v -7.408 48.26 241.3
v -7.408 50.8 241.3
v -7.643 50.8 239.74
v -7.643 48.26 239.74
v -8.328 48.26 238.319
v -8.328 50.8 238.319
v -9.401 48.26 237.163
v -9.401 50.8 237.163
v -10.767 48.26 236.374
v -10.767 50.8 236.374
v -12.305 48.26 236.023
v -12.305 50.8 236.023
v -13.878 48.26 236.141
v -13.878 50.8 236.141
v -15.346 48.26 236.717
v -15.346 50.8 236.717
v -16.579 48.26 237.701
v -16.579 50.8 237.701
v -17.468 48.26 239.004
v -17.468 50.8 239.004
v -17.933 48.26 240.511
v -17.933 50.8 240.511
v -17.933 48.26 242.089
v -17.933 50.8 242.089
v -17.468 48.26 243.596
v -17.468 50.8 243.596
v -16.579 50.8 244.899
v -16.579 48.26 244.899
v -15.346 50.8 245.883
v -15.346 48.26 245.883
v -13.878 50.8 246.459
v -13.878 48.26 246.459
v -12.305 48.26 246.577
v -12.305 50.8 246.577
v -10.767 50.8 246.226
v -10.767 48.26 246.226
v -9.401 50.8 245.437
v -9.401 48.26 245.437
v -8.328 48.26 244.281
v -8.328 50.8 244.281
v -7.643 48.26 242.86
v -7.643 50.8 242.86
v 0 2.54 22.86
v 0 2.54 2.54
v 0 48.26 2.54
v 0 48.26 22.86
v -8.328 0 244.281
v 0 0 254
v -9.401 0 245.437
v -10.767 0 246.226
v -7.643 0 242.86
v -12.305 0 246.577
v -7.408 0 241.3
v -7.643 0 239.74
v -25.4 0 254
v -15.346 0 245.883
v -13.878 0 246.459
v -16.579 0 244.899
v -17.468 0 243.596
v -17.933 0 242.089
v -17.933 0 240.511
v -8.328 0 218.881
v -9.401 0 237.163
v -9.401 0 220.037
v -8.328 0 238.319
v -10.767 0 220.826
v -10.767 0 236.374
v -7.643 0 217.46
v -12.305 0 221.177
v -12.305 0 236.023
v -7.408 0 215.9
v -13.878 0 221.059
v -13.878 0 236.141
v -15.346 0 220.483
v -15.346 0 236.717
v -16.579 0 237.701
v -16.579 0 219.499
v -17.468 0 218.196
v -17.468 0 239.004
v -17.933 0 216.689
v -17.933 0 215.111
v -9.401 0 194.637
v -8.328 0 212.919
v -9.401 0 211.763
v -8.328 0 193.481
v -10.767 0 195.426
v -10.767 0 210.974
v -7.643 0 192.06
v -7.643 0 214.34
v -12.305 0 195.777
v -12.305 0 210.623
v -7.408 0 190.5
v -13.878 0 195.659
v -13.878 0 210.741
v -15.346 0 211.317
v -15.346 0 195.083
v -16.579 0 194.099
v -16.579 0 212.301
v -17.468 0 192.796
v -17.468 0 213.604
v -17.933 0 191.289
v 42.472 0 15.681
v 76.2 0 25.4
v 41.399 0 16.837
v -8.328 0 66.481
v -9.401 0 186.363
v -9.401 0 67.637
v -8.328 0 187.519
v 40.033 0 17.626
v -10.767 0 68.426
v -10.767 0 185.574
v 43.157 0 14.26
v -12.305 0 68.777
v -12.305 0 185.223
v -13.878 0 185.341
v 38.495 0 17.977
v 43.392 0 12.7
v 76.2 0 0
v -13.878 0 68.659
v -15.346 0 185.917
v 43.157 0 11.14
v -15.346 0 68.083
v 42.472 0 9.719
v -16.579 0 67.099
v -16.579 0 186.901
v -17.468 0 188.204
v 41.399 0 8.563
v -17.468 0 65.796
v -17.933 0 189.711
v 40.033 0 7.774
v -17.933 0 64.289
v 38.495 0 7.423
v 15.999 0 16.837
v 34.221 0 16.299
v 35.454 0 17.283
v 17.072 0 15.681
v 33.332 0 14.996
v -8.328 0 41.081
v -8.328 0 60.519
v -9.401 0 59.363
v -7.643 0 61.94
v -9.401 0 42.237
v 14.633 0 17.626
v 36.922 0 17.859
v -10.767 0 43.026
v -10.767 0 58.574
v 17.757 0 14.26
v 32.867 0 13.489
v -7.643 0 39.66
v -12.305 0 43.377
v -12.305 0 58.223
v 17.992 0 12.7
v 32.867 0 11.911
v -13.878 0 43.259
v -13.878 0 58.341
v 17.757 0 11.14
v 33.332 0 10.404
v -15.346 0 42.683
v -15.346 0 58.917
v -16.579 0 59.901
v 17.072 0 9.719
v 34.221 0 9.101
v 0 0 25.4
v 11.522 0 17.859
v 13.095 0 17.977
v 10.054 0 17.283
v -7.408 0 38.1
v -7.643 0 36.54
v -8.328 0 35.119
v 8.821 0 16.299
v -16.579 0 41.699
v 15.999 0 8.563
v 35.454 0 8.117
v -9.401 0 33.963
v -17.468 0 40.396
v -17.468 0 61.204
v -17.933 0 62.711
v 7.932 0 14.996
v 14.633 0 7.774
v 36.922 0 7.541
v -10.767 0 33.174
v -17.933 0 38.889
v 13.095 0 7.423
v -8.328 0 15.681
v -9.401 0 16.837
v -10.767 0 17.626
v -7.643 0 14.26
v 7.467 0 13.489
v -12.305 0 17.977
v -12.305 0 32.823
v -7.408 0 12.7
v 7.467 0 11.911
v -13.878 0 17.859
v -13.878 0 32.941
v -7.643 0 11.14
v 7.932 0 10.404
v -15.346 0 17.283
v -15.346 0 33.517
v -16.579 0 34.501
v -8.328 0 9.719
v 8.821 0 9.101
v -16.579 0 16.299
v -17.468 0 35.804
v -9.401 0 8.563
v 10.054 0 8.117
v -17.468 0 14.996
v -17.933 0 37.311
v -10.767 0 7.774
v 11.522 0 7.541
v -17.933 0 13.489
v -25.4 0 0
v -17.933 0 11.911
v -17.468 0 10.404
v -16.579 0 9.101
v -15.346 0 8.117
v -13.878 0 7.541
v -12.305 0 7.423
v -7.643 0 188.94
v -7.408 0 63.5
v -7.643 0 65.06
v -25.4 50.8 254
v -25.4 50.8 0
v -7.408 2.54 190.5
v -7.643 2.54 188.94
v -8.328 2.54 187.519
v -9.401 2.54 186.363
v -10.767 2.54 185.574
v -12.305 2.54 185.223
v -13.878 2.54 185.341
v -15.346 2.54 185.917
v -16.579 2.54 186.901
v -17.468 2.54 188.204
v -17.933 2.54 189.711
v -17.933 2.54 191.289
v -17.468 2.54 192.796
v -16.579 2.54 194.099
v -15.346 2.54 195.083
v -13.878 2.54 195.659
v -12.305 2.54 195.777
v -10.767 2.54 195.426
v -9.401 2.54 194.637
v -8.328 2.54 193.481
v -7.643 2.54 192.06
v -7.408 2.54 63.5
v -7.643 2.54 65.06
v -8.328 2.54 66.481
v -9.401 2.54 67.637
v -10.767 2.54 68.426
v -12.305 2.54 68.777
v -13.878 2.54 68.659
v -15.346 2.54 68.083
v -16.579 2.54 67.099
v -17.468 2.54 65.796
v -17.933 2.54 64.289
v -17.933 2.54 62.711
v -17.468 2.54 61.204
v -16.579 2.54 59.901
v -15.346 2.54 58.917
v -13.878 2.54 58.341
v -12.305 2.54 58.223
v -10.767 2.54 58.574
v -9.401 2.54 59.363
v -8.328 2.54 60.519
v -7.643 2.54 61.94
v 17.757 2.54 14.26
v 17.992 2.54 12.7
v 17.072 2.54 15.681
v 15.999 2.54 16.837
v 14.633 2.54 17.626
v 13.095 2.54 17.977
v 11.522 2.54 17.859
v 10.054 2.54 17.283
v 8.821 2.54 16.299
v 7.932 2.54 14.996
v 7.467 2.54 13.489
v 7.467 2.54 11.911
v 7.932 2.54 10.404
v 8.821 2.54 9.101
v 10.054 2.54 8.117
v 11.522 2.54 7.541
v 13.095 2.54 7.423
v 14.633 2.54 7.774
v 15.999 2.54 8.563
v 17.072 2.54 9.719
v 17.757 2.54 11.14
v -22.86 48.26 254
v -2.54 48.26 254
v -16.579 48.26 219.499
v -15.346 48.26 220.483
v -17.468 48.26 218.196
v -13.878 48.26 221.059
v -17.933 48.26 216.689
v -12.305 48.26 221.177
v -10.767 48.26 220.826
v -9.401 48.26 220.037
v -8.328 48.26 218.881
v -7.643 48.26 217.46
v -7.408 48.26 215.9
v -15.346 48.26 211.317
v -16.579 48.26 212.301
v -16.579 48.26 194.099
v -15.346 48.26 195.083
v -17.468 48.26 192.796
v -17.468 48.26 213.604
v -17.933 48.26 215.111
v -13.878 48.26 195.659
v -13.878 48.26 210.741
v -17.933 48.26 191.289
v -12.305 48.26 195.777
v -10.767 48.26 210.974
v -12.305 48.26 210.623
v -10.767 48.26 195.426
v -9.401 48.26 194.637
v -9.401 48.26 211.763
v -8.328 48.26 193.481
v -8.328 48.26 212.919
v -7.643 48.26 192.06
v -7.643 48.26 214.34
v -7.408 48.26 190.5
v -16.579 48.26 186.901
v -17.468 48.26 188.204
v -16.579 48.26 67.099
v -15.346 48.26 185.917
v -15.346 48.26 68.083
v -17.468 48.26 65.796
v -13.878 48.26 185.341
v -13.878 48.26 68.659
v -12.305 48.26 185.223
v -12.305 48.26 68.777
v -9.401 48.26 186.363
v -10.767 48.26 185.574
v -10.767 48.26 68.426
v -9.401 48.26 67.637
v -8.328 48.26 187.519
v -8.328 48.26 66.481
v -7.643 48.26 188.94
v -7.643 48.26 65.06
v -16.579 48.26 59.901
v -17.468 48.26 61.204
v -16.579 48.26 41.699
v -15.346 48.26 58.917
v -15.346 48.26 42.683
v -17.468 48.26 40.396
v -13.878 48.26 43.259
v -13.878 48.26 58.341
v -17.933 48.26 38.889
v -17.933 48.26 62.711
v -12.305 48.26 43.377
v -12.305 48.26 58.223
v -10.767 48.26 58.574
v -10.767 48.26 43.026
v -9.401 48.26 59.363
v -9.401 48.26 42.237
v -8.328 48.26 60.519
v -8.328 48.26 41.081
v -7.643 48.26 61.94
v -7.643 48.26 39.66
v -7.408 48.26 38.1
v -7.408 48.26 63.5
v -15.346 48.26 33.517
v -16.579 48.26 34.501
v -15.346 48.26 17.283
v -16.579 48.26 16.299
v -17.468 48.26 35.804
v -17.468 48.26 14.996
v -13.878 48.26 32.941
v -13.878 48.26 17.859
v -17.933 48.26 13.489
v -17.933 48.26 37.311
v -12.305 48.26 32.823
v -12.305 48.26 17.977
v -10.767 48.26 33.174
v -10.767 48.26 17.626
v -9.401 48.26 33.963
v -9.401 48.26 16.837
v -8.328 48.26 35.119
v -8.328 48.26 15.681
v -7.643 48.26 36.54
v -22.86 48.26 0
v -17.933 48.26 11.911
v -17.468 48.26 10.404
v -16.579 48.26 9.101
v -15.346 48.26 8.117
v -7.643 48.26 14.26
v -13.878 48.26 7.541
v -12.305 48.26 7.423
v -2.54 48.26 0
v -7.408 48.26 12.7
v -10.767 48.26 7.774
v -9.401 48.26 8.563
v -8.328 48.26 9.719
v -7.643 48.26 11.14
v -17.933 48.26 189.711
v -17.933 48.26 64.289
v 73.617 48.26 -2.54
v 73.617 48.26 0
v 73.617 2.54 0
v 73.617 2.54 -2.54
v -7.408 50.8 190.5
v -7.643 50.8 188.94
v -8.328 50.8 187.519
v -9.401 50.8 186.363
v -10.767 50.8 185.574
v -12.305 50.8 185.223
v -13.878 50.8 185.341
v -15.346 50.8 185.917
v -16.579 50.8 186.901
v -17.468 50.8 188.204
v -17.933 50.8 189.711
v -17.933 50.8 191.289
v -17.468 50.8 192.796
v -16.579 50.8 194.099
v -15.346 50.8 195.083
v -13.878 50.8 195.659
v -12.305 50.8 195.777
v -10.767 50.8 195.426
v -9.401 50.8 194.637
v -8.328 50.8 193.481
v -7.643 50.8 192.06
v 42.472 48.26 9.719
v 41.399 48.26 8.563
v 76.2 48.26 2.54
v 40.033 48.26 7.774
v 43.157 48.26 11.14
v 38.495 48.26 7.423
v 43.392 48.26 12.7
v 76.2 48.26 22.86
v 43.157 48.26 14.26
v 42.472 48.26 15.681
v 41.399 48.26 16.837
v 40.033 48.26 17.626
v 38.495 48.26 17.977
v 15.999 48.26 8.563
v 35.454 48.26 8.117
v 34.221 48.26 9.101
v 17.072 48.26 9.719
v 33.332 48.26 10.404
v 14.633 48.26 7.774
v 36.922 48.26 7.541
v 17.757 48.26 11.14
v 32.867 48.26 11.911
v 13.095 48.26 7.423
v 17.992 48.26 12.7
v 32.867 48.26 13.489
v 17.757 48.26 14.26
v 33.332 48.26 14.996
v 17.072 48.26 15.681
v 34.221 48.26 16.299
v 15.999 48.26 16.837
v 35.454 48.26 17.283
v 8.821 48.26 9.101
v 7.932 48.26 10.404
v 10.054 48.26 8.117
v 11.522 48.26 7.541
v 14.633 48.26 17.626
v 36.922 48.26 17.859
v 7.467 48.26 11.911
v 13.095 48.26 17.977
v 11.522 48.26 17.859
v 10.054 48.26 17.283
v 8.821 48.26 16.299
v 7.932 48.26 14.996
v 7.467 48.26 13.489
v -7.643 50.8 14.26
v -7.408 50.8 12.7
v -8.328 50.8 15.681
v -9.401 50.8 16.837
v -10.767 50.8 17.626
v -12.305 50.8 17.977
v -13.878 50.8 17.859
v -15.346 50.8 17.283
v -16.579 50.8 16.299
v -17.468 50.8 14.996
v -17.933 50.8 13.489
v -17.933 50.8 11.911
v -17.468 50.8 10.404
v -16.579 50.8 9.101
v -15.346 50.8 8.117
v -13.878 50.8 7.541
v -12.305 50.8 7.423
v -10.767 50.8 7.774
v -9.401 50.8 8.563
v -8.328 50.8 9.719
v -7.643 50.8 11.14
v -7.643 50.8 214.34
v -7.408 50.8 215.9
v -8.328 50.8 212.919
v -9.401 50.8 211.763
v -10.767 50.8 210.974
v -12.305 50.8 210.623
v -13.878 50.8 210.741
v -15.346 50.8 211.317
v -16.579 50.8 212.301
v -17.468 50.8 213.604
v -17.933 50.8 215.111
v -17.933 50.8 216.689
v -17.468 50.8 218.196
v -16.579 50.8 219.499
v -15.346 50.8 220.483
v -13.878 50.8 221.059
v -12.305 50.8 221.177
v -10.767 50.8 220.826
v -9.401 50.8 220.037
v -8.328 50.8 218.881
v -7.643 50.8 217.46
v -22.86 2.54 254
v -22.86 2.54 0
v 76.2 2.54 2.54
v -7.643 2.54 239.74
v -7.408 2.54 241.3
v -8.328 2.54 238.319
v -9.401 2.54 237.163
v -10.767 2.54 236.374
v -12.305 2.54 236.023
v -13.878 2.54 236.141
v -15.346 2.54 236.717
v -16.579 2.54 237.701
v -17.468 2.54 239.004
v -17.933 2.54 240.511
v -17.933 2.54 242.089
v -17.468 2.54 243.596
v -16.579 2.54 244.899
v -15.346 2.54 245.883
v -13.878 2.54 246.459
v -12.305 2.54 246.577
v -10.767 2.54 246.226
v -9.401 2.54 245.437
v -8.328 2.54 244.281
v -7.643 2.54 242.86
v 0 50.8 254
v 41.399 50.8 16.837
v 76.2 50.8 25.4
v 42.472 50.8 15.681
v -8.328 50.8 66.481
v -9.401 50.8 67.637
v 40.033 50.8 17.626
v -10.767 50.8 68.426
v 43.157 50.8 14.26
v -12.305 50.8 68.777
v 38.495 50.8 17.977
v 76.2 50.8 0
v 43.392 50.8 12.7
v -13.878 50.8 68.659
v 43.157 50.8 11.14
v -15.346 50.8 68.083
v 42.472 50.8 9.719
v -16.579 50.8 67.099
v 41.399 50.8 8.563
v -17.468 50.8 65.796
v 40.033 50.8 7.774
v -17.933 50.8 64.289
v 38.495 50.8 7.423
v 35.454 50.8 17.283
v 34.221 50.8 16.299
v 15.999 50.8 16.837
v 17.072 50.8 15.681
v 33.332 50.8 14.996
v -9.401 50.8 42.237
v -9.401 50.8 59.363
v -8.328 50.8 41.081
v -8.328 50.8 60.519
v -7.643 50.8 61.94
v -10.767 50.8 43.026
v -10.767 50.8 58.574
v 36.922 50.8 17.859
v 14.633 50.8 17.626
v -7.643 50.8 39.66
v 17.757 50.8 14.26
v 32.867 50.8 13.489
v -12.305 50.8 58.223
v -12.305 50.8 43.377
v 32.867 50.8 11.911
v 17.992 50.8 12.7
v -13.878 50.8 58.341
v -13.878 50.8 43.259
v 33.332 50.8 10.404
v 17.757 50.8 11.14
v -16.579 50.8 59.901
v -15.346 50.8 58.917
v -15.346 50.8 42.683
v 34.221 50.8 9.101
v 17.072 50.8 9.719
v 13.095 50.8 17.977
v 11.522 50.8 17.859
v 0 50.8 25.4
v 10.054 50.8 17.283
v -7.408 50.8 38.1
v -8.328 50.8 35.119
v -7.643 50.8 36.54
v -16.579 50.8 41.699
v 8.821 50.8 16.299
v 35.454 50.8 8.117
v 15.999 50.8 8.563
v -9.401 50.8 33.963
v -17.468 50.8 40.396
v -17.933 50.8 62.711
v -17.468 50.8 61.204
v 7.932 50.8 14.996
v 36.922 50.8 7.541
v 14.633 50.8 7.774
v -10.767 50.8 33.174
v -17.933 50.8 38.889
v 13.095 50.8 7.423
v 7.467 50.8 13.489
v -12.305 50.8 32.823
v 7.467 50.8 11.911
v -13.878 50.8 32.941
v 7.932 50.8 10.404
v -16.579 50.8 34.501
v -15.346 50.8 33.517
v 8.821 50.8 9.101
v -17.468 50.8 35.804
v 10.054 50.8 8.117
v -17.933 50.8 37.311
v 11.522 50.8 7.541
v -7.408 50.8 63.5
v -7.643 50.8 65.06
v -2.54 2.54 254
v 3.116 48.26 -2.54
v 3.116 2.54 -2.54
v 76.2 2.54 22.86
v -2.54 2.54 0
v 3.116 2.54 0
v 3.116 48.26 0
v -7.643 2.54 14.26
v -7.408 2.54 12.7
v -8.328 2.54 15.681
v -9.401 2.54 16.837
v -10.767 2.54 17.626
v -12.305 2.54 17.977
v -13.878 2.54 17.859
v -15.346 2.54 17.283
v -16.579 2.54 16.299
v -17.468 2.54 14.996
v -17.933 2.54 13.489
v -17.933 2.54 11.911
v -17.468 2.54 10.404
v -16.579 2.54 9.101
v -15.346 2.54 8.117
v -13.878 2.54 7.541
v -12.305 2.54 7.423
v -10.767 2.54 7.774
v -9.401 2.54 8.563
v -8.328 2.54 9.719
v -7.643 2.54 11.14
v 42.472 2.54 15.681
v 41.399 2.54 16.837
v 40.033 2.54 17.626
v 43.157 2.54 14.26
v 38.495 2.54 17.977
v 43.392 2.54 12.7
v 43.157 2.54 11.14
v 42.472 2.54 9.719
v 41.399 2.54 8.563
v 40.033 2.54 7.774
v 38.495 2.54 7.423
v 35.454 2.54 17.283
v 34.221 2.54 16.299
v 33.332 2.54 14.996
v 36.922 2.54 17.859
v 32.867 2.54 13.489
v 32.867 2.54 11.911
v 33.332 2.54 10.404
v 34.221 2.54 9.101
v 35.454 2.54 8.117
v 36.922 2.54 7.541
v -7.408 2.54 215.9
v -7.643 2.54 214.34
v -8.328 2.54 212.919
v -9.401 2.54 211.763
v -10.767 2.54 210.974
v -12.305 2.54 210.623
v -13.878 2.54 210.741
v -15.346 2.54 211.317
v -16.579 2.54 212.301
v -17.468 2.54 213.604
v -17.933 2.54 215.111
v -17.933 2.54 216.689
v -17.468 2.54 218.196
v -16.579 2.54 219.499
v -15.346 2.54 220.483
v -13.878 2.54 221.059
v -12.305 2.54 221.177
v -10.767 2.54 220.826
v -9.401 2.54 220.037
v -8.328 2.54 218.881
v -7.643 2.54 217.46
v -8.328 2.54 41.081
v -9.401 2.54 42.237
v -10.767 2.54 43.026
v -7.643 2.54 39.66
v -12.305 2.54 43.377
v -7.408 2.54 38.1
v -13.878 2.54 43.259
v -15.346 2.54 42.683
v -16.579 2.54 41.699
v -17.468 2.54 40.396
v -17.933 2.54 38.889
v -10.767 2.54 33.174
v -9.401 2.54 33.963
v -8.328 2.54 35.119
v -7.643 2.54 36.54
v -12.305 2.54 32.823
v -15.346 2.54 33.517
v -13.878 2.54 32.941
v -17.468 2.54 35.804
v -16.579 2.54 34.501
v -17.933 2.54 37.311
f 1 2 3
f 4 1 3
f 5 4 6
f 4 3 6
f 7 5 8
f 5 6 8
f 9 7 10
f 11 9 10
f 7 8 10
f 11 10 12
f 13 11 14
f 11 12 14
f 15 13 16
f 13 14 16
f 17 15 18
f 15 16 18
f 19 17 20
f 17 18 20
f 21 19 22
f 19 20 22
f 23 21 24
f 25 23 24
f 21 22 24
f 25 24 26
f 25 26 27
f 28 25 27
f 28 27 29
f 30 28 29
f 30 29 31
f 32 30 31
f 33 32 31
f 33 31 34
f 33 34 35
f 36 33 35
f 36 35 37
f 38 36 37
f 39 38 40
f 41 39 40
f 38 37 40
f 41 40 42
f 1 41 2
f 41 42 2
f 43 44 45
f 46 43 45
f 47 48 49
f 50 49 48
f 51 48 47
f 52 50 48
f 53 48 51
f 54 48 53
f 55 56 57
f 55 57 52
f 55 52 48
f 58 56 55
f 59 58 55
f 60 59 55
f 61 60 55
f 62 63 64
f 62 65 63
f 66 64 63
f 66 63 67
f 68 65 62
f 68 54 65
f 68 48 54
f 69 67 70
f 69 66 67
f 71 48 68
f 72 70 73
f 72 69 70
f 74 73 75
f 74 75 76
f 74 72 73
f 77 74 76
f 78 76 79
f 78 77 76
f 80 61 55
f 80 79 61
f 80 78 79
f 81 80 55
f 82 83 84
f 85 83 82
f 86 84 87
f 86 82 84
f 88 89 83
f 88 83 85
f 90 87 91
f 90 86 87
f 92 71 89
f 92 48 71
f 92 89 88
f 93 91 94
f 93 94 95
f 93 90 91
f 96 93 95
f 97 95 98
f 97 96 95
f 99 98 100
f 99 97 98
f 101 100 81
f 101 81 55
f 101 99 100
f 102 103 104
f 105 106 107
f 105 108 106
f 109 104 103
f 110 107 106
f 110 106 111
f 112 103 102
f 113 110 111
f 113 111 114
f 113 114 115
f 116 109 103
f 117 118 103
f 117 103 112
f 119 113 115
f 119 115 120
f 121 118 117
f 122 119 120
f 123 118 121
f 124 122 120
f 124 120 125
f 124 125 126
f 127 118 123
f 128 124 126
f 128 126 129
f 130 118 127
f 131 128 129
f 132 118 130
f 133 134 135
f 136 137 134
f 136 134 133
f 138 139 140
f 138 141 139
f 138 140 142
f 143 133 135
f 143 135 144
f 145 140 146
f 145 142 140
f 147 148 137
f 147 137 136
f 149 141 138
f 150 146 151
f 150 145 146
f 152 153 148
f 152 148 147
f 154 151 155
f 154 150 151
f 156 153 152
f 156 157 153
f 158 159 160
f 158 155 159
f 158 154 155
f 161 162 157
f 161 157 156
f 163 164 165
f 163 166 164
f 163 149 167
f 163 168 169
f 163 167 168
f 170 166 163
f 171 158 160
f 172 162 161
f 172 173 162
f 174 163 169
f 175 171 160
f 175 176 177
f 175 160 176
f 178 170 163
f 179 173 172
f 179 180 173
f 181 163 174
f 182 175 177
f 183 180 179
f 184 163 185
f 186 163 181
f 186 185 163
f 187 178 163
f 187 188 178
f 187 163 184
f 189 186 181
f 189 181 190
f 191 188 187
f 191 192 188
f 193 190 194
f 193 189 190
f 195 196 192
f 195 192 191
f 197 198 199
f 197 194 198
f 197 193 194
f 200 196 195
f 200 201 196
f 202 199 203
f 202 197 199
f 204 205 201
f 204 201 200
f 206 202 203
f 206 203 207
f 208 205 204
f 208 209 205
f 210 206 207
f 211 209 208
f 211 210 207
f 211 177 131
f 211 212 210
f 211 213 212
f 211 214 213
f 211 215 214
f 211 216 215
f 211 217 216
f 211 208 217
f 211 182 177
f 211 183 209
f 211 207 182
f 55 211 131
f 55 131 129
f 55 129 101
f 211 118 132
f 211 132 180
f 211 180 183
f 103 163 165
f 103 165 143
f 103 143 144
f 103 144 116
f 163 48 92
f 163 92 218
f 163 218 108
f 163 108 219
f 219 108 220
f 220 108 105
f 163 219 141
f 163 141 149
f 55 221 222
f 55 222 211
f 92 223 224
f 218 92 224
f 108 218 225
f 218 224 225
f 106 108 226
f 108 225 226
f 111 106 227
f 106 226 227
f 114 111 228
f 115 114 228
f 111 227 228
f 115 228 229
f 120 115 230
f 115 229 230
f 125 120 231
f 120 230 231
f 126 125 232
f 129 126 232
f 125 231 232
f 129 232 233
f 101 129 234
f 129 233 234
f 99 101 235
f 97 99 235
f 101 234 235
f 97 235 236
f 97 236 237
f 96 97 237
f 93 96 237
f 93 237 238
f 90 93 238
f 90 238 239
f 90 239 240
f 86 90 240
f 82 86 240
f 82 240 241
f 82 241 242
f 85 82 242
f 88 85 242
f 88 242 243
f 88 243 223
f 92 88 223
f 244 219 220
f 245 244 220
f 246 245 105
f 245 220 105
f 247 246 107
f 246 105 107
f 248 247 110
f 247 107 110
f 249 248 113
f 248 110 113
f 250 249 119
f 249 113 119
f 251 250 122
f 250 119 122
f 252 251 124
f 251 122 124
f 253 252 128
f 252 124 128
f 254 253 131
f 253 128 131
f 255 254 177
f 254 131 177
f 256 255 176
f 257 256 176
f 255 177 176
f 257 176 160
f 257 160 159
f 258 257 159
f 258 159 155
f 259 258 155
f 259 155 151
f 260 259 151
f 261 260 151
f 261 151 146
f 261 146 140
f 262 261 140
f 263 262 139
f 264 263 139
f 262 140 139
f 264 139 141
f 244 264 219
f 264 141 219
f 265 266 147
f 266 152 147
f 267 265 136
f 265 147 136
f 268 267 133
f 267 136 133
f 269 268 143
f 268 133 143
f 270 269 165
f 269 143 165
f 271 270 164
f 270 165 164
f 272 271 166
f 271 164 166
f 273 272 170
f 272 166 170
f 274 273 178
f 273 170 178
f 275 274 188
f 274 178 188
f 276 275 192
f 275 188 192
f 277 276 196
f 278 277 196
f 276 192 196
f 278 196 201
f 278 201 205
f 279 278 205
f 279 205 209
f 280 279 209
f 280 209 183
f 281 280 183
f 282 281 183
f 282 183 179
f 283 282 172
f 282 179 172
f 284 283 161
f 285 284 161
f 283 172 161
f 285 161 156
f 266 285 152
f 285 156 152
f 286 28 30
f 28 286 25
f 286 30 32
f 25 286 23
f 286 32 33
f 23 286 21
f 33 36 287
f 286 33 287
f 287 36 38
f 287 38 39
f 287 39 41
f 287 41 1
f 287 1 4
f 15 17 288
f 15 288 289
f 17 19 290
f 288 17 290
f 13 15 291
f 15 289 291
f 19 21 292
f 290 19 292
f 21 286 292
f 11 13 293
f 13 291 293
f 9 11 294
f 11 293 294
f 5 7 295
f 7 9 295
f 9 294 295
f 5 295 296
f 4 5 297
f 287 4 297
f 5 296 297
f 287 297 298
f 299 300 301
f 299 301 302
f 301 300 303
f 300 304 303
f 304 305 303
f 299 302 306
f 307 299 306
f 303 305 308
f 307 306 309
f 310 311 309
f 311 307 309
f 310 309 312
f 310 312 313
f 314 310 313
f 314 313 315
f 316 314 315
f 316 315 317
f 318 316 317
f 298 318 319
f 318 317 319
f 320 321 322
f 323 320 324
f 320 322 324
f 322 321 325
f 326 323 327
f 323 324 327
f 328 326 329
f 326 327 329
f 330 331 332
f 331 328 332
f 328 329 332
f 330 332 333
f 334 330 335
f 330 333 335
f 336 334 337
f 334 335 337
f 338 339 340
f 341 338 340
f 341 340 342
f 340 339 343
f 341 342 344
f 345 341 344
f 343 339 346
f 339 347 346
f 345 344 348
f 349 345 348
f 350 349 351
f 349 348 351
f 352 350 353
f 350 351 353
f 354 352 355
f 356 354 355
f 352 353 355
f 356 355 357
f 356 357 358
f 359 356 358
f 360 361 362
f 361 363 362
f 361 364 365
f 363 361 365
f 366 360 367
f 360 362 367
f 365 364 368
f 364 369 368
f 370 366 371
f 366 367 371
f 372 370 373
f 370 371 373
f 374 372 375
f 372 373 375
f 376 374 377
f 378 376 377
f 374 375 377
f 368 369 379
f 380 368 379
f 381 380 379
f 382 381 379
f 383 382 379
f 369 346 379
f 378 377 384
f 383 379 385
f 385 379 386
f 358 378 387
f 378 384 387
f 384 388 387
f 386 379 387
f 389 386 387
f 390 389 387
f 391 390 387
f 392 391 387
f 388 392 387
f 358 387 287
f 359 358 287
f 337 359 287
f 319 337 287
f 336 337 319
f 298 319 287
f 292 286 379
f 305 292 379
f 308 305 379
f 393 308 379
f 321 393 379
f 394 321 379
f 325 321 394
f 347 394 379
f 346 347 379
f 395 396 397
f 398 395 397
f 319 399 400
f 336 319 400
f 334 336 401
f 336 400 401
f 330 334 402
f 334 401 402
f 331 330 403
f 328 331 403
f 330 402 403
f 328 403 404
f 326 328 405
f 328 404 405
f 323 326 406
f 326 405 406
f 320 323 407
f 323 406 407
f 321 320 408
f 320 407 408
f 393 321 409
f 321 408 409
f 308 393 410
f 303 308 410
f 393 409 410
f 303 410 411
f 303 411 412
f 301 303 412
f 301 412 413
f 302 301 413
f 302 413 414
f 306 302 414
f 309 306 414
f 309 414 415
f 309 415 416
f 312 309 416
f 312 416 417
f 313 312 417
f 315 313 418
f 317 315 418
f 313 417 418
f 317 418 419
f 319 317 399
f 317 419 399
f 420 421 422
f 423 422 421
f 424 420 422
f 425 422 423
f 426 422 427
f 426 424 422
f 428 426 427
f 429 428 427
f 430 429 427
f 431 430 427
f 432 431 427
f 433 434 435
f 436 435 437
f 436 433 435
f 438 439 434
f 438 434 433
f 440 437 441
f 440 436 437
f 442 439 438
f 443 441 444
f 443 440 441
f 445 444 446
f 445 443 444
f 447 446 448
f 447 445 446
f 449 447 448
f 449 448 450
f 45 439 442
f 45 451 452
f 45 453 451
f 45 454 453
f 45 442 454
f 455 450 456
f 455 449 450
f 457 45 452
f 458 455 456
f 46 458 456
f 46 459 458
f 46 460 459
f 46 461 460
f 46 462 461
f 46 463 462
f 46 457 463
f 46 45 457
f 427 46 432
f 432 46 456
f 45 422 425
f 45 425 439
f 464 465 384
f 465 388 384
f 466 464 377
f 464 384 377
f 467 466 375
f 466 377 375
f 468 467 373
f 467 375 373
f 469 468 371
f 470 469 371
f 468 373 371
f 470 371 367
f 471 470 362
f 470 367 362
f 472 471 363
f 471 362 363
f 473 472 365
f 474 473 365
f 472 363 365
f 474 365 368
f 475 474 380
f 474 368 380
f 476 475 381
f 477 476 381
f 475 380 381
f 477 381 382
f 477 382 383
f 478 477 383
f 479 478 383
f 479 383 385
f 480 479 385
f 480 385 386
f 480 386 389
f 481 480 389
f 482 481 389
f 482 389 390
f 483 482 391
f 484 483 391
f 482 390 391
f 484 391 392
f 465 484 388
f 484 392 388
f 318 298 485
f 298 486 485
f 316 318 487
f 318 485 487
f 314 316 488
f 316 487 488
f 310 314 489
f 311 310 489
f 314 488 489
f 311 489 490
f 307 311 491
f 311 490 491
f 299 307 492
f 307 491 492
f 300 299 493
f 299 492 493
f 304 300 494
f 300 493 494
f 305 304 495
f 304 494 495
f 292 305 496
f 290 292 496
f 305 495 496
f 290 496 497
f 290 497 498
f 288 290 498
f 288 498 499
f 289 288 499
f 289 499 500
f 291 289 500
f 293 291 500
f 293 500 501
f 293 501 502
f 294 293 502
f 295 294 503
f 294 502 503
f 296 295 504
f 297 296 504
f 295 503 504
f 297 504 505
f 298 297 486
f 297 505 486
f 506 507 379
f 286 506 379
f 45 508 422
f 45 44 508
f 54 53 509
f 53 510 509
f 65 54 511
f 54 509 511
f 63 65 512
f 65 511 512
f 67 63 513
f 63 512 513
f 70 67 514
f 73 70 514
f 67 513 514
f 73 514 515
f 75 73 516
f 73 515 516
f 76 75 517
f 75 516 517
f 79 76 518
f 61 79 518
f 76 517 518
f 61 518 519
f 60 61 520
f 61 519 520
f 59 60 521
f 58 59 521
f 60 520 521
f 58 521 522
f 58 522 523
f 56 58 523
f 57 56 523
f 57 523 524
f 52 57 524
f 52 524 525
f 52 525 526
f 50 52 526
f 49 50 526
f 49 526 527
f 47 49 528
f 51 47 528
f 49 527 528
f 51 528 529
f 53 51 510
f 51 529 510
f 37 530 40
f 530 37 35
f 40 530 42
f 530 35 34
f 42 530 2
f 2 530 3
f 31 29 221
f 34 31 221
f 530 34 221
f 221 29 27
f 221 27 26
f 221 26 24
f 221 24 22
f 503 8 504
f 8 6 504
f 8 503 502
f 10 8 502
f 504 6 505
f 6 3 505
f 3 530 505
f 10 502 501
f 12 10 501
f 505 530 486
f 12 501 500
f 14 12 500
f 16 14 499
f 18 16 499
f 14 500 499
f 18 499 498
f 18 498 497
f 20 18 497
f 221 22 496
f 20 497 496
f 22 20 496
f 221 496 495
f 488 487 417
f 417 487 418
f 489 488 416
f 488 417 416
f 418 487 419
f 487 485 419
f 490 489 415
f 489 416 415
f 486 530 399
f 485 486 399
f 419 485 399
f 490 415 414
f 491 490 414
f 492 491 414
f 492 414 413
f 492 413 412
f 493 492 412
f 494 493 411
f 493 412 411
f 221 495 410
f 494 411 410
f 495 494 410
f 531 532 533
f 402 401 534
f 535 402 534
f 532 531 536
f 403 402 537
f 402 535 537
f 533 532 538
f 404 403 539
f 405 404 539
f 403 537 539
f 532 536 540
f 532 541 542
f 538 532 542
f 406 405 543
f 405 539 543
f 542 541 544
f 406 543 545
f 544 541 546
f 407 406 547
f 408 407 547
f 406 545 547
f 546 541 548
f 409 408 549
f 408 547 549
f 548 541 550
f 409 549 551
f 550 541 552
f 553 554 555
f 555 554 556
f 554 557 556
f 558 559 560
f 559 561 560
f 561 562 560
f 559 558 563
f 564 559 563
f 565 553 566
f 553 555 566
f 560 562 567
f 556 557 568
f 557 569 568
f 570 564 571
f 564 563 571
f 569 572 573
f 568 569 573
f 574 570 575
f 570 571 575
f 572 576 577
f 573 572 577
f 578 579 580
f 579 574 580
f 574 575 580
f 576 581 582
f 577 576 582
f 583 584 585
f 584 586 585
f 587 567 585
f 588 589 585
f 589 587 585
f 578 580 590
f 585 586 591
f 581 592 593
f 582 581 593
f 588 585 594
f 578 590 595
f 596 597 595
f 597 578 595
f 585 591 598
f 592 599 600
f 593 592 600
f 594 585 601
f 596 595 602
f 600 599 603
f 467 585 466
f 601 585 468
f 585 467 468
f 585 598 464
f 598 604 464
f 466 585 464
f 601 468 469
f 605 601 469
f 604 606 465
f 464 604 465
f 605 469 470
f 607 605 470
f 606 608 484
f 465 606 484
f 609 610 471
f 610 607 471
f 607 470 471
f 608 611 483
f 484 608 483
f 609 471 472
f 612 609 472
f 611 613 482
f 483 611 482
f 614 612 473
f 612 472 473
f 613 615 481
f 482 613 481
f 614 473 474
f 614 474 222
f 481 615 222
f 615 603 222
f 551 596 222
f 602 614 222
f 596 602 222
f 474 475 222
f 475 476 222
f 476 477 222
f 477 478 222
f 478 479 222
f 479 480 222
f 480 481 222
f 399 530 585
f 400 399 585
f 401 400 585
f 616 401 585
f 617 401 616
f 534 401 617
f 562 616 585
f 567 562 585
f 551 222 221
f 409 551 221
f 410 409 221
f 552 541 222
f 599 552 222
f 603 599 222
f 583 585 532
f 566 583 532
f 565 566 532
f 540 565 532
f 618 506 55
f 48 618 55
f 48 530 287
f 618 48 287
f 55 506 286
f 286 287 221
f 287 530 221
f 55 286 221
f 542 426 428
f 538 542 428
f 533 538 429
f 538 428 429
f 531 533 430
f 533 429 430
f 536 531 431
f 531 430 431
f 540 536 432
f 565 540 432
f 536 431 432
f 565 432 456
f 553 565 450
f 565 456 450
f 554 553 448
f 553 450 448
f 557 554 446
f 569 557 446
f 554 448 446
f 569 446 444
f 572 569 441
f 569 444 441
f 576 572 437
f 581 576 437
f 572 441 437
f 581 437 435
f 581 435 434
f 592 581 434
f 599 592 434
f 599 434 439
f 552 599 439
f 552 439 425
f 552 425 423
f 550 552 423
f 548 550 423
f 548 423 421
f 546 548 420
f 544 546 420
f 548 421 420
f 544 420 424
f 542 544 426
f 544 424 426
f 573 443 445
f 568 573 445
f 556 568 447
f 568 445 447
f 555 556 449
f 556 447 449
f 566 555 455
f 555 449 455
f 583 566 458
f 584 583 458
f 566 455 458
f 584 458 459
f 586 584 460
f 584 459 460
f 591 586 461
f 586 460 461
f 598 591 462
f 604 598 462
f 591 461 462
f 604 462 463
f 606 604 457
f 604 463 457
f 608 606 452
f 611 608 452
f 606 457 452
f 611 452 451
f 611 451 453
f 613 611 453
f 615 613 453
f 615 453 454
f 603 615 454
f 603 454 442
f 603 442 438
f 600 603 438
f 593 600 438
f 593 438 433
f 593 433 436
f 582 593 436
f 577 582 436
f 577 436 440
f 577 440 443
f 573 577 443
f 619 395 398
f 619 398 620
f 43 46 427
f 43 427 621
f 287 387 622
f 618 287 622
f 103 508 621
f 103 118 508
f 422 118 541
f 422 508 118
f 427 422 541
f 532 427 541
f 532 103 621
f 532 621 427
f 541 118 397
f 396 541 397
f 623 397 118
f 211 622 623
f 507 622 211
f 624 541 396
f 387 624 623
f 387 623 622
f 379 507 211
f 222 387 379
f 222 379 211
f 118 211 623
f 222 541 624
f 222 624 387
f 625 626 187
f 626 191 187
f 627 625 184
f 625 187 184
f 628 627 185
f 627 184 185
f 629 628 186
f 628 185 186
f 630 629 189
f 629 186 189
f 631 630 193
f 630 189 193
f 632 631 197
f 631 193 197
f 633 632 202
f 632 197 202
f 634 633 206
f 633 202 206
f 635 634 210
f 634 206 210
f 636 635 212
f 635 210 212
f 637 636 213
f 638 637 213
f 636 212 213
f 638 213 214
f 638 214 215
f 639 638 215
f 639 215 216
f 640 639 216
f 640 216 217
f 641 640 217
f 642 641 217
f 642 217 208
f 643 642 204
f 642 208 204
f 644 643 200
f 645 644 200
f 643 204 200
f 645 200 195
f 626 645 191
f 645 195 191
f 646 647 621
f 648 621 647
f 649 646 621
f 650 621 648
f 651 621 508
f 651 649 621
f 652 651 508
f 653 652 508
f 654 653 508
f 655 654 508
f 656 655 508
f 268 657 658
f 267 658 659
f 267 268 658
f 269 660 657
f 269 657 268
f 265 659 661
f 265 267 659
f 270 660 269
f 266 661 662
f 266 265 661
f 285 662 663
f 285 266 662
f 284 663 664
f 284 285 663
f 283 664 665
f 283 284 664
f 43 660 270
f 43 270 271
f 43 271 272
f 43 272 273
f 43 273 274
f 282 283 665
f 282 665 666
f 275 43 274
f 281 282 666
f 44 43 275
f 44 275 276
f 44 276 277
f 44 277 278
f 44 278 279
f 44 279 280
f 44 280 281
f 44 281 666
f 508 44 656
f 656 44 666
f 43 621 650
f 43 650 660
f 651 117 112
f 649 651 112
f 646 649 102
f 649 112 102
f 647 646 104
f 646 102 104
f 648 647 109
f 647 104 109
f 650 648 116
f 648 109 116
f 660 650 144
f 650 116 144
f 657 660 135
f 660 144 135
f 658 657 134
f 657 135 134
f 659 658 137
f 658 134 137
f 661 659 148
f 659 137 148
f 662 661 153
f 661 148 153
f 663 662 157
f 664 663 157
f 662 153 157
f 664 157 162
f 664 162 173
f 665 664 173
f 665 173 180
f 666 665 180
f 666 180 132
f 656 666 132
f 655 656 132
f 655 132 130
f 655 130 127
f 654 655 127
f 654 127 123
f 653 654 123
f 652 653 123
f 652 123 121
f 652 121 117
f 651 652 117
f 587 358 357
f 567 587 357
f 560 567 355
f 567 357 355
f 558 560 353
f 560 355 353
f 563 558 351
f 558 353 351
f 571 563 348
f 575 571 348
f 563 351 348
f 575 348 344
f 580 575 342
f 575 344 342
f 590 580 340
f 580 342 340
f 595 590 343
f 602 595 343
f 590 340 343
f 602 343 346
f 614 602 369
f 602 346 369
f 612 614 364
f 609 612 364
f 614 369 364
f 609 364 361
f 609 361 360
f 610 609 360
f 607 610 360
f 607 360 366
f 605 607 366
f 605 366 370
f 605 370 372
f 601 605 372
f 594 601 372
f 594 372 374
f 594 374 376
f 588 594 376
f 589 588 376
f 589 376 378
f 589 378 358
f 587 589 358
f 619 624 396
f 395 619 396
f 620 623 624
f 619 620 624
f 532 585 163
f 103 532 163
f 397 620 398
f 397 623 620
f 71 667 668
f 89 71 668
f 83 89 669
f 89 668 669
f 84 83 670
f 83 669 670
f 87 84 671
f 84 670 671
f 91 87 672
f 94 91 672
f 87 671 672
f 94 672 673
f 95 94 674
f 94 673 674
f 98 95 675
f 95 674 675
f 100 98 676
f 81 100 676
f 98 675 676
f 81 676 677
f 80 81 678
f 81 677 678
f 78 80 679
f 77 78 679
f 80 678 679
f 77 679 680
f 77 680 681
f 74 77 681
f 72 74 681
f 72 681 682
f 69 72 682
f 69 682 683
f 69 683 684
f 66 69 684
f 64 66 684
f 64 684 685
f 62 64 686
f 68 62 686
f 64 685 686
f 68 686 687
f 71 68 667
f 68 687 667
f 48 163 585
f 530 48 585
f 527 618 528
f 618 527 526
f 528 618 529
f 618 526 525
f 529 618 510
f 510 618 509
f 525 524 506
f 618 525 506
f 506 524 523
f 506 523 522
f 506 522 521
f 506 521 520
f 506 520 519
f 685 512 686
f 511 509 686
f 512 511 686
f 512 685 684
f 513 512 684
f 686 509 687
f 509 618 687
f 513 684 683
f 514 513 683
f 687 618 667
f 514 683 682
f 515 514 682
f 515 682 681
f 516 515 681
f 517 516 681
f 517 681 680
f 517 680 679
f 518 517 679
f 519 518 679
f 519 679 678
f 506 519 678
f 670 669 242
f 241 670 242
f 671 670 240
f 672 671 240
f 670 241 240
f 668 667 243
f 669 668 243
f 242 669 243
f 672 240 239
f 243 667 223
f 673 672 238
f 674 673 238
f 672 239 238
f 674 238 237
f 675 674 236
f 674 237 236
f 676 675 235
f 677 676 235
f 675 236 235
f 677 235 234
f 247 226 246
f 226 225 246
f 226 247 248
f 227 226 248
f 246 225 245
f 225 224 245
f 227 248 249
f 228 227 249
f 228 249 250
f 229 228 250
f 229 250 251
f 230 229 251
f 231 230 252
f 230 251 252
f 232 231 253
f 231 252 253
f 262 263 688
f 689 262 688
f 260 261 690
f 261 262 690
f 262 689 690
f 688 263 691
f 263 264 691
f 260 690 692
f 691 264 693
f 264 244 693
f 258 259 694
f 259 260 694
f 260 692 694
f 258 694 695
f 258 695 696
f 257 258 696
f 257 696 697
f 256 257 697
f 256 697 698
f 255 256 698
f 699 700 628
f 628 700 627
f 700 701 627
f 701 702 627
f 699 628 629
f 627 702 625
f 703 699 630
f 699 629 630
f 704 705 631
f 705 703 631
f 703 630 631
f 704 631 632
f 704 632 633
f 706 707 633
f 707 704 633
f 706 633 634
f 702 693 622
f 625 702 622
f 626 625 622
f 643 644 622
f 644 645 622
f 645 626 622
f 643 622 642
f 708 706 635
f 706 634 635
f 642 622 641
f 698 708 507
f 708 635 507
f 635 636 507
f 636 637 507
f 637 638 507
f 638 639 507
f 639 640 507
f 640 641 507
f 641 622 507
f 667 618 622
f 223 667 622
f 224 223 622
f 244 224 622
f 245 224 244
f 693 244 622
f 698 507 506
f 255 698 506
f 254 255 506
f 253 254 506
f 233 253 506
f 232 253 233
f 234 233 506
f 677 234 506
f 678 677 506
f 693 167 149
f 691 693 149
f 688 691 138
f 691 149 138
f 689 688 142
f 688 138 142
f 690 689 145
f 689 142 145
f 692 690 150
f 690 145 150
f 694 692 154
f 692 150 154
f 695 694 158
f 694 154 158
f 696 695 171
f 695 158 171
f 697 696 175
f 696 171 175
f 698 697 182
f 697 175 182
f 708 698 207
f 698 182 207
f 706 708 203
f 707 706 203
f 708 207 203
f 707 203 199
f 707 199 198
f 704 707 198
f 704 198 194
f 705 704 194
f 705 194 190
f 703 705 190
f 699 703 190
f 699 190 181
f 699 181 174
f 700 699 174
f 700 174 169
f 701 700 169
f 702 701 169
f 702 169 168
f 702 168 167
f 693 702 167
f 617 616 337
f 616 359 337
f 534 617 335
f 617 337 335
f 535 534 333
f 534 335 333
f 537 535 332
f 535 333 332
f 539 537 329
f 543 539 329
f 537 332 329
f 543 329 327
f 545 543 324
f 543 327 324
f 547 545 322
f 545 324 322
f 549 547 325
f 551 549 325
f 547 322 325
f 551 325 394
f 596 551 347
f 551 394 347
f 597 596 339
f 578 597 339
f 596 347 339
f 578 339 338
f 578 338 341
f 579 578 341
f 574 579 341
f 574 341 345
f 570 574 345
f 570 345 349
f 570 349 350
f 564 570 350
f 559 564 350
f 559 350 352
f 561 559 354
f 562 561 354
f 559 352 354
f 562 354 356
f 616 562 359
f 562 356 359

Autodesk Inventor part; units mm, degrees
ref_plane "YZ Plane" through (0, 0, 0) normal (1, 0, 0) x (0, 1, 0)
ref_plane "XZ Plane" through (0, 0, 0) normal (0, 1, 0) x (-1, 0, 0)
ref_plane "XY Plane" through (0, 0, 0) normal (0, 0, 1) x (1, 0, 0)
sketch "Sketch15" plane through (0, 0, 0) normal (1, 0, 0) x (0, 1, 0)
  line L0 (0, 0) -> (50.8, 0)
  line L1 (50.8, 0) -> (50.8, 25.4)
  line L2 (50.8, 25.4) -> (0, 25.4)
  line L3 (0, 25.4) -> (0, 0)
  line L4 (48.26, 22.86) -> (2.54, 22.86)
  line L5 (2.54, 22.86) -> (2.54, 2.54)
  line L6 (2.54, 2.54) -> (48.26, 2.54)
  line L7 (48.26, 2.54) -> (48.26, 22.86)
  dimension "d46" = 25.4
  dimension "d47" = 50.8
  dimension "d48" = 2.54
  dimension "d49" = 2.54
  dimension "d50" = 2.54
  dimension "d51" = 2.54
extrude "Extrusion12" add sketch "Sketch15" along normal blind 76.2
sketch "Sketch17" plane through (0, 0, 0) normal (0, 0, -1) x (-1, 0, 0)
  line L0 (0, 2.54) -> (-76.2, 2.54) projected
  line L1 (0, 48.26) -> (-76.2, 48.26) projected
  line L2 (-73.617, 2.54) -> (-3.1161, 2.54)
  line L3 (-3.1161, 2.54) -> (-3.1161, 48.26)
  line L4 (-3.1161, 48.26) -> (-73.617, 48.26)
  line L5 (-73.617, 48.26) -> (-73.617, 2.54)
  point P0 (0, 0)
extrude "Extrusion14" add sketch "Sketch17" along normal blind 2.54
sketch "Sketch20" plane through (0, 0, 0) normal (0, 0, -1) x (-1, 0, 0)
  line L0 (0, 0) -> (25.4, 0)
  line L1 (25.4, 0) -> (0, 0)
  line L2 (0, 0) -> (0, 50.8)
  line L3 (0, 50.8) -> (25.4, 50.8)
  line L4 (25.4, 50.8) -> (25.4, 0)
  line L5 (22.86, 48.26) -> (2.54, 48.26)
  line L6 (2.54, 48.26) -> (2.54, 2.54)
  line L7 (2.54, 2.54) -> (22.86, 2.54)
  line L8 (22.86, 2.54) -> (22.86, 48.26)
  line L9 (0, 0) -> (0, 50.8) projected
  dimension "d71" = 25.4
  dimension "d72" = 50.8
  dimension "d73" = 2.54
  dimension "d74" = 2.54
  dimension "d75" = 2.54
  dimension "d76" = 2.54
  dimension "d78" = 0
extrude "Extrusion16" add sketch "Sketch20" against normal blind 254
sketch "Sketch21" plane through (76.2, 0, 0) normal (0, -1, 0) x (1, 0, 0)
  circle A0 centre (-38.1, 12.7) radius 5.2917
  circle A1 centre (-63.5, 12.7) radius 5.2917
  circle A2 centre (-88.9, 12.7) radius 5.2917
  circle A3 centre (-88.9, 38.1) radius 5.2917
  circle A4 centre (-88.9, 63.5) radius 5.2917
  line L0 (-76.2, 25.4) -> (0, 25.4) projected
  line L1 (-101.6, 0) -> (-101.6, 254) projected
  line L2 (-76.2, 25.4) -> (-76.2, 254) projected
  point P0 (-76.2, 0)
  dimension "d81" = 12.7
  dimension "d82" = 12.7
  dimension "d83" = 12.7
  dimension "d84" = 25.4
  dimension "d85" = 12.7
  dimension "d86" = 10.5833
  dimension "d87" = 10.5833
  dimension "d88" = 10.5833
  dimension "d89" = 25.4
  dimension "d90" = 25.4
  dimension "d91" = 25.4
  dimension "d92" = 10.5833
  dimension "d93" = 10.5833
  dimension "d94" = 12.7
  dimension "d95" = 12.7
extrude "Extrusion17" cut sketch "Sketch21" against normal blind 76.2
sketch "Sketch22" plane through (76.2, 50.8, 25.4) normal (0, 1, 0) x (1, 0, 0)
  circle A0 centre (-88.9, -215.9) radius 5.2917
  circle A1 centre (-88.9, -190.5) radius 5.2917
  circle A2 centre (-88.9, -165.1) radius 5.2917
  line L0 (-76.2, 0) -> (-76.2, -228.6) projected
  line L1 (-76.2, -228.6) -> (-101.6, -228.6) projected
  point P0 (-76.2, 25.4)
  dimension "d98" = 25.4
  dimension "d99" = 25.4
  dimension "d100" = 12.7
  dimension "d101" = 12.7
  dimension "d102" = 12.7
  dimension "d103" = 10.5833
  dimension "d104" = 10.5833
  dimension "d105" = 10.5833
  dimension "d108" = 12.7
extrude "Extrusion18" cut sketch "Sketch22" against normal blind 76.2
equation "\"d49\" = d48"
equation "\"d50\" = d48"
equation "\"d51\" = d48"
equation "\"d73\" = d77"
equation "\"d74\" = d77"
equation "\"d75\" = d77"
equation "\"d76\" = d77"
equation "\"d87\" = d86"
equation "\"d88\" = d86"
equation "\"d92\" = d86"
equation "\"d93\" = d86"
equation "\"d101\" = d100"
equation "\"d102\" = d100"
equation "\"d104\" = d103"
equation "\"d105\" = d103"
equation "\"d77\" = 2.54"
properties part number "left arm"
